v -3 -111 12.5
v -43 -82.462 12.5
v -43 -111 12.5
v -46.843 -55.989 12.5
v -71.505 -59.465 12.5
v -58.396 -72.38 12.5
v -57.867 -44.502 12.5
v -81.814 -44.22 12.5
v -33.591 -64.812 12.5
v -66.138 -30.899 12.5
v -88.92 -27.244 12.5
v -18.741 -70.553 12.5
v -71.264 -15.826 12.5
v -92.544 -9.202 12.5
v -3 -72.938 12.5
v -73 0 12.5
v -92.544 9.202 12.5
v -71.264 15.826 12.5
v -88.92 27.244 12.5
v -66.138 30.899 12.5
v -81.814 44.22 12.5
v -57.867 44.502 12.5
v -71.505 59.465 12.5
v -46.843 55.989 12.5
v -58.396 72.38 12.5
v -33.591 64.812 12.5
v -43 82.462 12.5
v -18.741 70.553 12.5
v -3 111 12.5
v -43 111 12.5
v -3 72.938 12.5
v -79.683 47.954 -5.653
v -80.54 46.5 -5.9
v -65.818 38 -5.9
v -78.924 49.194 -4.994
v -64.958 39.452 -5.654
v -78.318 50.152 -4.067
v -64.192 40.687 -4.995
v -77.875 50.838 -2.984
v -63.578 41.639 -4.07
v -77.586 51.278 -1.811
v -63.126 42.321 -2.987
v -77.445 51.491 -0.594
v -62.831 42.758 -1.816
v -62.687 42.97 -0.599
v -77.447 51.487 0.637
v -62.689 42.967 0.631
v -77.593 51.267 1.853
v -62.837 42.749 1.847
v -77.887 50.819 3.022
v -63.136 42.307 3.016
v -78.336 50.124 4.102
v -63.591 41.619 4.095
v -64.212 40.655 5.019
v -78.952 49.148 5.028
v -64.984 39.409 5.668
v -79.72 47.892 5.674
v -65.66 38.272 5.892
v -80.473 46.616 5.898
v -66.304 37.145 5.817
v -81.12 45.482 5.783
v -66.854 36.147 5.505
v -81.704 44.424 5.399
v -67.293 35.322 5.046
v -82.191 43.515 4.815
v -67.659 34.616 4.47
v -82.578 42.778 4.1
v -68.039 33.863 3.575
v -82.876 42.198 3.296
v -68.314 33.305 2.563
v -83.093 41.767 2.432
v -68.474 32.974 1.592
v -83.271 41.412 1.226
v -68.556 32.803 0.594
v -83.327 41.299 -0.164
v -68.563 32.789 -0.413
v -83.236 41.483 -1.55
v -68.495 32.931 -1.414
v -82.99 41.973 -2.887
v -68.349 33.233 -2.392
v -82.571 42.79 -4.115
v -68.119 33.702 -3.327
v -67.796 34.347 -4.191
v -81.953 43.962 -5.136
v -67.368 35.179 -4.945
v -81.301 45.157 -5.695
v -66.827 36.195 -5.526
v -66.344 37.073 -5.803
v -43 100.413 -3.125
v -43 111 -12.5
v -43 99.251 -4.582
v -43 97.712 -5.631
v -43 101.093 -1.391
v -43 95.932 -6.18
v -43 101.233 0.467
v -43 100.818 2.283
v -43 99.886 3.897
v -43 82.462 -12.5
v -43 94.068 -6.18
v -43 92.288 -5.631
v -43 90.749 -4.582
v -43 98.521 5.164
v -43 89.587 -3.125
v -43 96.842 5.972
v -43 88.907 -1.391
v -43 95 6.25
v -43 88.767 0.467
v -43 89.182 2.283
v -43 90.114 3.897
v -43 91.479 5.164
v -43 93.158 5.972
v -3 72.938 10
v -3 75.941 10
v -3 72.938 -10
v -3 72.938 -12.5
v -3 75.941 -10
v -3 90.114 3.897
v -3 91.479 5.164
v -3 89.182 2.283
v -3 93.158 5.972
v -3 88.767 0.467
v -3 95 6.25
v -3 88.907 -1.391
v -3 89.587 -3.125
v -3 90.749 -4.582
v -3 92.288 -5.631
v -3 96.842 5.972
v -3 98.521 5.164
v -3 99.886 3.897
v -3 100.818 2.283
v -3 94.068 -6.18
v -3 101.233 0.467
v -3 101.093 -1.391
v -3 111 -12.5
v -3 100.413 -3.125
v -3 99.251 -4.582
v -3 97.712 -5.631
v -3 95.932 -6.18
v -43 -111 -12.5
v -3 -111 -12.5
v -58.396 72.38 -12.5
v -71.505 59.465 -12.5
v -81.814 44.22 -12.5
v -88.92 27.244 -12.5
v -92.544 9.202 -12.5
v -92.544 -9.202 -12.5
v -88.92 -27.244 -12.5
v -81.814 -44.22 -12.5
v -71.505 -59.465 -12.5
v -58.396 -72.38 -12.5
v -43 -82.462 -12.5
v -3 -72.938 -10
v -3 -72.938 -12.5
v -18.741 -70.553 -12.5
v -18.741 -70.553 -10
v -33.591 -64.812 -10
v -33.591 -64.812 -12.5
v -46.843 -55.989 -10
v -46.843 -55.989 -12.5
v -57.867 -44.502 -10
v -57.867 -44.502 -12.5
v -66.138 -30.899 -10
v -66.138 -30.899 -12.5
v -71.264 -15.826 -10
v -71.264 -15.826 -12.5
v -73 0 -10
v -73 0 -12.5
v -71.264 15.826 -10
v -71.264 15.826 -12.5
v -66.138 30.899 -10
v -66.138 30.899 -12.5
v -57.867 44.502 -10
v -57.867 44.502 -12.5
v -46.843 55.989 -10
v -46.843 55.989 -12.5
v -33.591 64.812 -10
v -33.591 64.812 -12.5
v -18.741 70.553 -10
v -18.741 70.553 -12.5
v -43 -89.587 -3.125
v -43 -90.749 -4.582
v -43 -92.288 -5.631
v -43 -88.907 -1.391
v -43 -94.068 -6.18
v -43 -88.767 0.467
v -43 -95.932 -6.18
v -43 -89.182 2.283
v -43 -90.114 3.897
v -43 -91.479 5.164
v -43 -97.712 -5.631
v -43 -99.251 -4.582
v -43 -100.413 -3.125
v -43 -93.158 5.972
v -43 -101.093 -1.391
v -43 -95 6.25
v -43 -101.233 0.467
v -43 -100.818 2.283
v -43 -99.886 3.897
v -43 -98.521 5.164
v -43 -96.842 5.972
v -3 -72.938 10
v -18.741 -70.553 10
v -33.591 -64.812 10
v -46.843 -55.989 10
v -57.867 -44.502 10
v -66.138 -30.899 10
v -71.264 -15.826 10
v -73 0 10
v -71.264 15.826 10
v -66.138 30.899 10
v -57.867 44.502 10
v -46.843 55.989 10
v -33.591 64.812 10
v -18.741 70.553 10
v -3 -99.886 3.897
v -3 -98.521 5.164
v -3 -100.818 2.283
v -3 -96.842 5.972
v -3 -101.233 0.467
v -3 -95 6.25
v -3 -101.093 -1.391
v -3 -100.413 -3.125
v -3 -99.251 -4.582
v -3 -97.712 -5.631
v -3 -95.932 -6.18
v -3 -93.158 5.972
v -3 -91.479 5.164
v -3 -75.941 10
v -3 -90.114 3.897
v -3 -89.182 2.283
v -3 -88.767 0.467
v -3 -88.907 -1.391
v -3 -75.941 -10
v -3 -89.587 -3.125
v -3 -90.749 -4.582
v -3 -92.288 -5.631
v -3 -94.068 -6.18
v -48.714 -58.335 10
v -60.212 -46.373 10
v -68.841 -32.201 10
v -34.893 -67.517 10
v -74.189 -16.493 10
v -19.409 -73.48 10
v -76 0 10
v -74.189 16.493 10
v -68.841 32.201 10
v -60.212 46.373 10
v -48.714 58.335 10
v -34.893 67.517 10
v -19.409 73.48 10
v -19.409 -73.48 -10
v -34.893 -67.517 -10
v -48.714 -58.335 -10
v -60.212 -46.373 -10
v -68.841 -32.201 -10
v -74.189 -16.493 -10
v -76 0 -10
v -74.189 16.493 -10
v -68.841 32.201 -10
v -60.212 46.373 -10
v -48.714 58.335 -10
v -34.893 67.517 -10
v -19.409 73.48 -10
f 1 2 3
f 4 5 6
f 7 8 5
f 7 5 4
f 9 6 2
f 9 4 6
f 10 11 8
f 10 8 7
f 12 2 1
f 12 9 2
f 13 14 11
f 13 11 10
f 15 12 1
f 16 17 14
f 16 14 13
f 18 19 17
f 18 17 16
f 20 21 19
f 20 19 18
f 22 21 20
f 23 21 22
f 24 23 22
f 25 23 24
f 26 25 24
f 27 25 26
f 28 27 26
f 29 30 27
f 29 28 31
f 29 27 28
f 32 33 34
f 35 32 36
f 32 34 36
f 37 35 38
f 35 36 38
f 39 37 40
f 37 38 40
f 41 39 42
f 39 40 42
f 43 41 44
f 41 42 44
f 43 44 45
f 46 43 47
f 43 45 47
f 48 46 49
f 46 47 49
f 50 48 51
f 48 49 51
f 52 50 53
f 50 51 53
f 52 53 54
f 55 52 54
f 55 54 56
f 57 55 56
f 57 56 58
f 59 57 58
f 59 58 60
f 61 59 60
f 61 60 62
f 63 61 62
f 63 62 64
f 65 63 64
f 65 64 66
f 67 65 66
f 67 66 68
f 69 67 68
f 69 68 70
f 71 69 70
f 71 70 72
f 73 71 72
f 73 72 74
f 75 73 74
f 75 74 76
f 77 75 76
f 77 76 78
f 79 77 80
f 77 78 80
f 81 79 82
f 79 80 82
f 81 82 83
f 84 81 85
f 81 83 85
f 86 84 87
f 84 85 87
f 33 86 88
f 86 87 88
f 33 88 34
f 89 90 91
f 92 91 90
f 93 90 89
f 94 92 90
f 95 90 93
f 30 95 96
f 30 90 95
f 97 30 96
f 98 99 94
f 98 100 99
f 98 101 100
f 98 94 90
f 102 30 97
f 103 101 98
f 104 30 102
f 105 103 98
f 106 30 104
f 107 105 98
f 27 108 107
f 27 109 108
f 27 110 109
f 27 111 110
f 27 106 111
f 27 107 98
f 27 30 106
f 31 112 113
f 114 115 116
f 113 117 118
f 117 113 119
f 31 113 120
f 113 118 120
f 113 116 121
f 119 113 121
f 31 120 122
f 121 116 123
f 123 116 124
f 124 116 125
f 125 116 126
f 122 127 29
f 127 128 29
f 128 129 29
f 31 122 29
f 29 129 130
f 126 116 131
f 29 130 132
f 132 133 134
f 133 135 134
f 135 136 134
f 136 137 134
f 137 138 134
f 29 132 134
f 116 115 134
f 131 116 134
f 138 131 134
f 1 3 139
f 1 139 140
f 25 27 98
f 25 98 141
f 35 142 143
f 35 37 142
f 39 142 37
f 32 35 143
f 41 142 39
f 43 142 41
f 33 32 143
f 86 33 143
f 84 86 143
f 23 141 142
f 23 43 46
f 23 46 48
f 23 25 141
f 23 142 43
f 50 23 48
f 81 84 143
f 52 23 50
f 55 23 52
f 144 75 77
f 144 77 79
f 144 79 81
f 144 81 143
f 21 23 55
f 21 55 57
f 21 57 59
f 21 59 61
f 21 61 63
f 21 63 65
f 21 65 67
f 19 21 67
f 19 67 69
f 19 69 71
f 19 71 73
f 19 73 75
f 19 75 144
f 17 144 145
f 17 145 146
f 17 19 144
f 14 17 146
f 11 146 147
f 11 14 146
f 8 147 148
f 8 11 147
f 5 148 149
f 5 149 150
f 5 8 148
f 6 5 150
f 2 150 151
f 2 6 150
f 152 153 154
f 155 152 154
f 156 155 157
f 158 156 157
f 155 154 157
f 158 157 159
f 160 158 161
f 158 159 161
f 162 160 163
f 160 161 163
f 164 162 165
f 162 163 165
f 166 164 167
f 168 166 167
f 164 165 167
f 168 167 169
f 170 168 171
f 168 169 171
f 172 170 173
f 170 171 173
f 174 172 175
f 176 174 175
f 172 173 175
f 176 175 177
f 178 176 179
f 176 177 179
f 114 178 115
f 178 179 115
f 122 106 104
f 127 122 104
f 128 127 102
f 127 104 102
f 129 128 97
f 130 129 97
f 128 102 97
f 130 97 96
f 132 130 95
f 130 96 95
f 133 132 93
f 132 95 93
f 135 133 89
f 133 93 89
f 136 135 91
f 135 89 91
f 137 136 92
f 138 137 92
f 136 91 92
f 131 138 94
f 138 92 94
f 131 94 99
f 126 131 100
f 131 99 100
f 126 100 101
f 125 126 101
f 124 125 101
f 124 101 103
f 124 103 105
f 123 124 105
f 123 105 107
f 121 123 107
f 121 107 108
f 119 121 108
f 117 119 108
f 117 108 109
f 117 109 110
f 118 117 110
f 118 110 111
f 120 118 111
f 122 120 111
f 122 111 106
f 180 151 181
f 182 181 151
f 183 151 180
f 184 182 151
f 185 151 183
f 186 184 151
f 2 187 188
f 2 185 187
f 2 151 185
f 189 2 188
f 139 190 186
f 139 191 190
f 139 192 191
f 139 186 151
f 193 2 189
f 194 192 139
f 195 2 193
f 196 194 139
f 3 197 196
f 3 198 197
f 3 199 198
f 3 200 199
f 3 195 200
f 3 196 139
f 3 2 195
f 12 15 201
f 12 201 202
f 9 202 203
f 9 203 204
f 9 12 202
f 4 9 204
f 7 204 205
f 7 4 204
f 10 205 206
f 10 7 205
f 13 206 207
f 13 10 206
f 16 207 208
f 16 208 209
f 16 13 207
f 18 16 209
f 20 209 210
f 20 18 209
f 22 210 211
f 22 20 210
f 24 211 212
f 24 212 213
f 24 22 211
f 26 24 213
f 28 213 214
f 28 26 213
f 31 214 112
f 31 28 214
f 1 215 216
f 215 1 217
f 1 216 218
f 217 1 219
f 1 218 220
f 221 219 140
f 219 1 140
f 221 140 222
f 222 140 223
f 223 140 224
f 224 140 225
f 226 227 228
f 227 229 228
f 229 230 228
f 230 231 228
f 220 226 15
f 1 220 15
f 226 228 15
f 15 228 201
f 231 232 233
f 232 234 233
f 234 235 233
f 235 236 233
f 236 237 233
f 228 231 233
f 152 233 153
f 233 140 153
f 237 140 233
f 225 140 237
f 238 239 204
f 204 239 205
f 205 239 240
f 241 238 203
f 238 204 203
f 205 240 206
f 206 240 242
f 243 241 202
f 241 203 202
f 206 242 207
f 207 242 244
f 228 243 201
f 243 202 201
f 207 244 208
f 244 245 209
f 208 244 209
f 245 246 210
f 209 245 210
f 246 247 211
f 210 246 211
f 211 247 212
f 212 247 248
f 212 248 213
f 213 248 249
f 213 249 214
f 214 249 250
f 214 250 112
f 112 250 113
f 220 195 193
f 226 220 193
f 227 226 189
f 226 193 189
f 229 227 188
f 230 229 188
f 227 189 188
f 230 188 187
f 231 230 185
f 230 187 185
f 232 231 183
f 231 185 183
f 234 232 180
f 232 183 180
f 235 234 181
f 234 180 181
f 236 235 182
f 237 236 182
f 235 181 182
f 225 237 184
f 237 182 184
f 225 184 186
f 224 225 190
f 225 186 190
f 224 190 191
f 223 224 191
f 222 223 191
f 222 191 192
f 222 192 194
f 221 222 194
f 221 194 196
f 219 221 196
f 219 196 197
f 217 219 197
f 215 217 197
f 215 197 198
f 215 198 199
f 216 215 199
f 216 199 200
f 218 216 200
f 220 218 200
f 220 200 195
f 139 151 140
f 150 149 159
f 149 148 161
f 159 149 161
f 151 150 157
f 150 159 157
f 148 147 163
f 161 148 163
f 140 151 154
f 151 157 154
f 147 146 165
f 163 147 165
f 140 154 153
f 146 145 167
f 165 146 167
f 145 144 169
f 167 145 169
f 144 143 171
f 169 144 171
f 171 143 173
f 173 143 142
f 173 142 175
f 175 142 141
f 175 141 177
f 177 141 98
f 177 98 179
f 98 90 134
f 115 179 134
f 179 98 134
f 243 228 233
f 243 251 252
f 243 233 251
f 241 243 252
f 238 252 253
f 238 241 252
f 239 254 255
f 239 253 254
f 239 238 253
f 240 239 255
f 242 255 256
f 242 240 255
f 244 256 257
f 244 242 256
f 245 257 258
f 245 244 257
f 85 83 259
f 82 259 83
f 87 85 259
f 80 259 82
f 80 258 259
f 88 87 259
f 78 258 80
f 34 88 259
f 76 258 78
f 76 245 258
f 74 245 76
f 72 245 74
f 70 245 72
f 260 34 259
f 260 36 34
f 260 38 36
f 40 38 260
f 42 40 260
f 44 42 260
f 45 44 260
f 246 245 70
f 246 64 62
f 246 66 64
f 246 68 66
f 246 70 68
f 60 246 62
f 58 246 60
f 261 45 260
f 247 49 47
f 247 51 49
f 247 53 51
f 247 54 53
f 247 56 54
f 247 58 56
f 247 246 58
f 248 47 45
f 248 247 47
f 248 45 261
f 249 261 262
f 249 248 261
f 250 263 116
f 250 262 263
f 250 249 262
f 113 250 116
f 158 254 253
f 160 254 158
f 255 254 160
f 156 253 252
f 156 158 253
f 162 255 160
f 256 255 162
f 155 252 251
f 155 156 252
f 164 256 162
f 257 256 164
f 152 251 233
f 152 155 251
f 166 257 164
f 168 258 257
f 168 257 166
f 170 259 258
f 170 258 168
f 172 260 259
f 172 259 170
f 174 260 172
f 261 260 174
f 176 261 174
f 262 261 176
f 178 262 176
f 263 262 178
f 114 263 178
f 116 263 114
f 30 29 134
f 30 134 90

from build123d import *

# Parameters (mm, degrees)
BOSS_EXTRUDE1_DEPTH    = 12.5
BOSS_EXTRUDE2_START    = 12.5
BOSS_EXTRUDE2_DEPTH    = 2.5
F_12_0MM_DOWEL_HOLE1_D = 12.5
G1_4_TAPPED_HOLE1_D    = 11.8


with BuildPart() as part:
    # Sketch1 → Boss-Extrude1 (new, symmetric)
    with BuildSketch(Plane.XY):
        with BuildLine():
            Line((-3, 111), (-43, 111))
            Line((-43, 111), (-43, 82.462112512))
            ThreePointArc((-43, 82.462112512), (-93, 0), (-43, -82.462112512))
            Line((-43, -82.462112512), (-43, -111))
            Line((-43, -111), (-3, -111))
            Line((-3, -111), (-3, -75.940766391))
            ThreePointArc((-3, -75.940766391), (-76, 0), (-3, 75.940766391))
            Line((-3, 75.940766391), (-3, 111))
        make_face()
    extrude(amount=BOSS_EXTRUDE1_DEPTH, both=True)

    # Sketch1<3> → Boss-Extrude2 (add)
    with BuildSketch(Plane.XY.offset(BOSS_EXTRUDE2_START)):
        with BuildLine():
            Line((-3, 72.938330115), (-3, 75.940766391))
            ThreePointArc((-3, 75.940766391), (-76, 0), (-3, -75.940766391))
            Line((-3, -75.940766391), (-3, -72.938330115))
            ThreePointArc((-3, -72.938330115), (-73, 0), (-3, 72.938330115))
        make_face()
    boss_extrude2 = extrude(amount=-BOSS_EXTRUDE2_DEPTH)

    # Ø12.0mm Dowel Hole1 (through all)
    with Locations(Plane(origin=(-3, 0, 0), x_dir=(0, 0, -1), z_dir=(1, 0, 0))):
        with Locations((0, 95), (0, -95)):
            Hole(F_12_0MM_DOWEL_HOLE1_D / 2)

    # Mirror2: Boss-Extrude2 across plane
    add(boss_extrude2.mirror(Plane.XY))

    # G1/4 Tapped Hole1 (through all)
    with Locations(Plane(origin=(-80.540362552, 46.5, 0), x_dir=(0, 0, 1), z_dir=(-0.8660254037844382, 0.500000000000001, 0))):
        with Locations((0, 0)):
            Hole(G1_4_TAPPED_HOLE1_D / 2)


solid = part.part
